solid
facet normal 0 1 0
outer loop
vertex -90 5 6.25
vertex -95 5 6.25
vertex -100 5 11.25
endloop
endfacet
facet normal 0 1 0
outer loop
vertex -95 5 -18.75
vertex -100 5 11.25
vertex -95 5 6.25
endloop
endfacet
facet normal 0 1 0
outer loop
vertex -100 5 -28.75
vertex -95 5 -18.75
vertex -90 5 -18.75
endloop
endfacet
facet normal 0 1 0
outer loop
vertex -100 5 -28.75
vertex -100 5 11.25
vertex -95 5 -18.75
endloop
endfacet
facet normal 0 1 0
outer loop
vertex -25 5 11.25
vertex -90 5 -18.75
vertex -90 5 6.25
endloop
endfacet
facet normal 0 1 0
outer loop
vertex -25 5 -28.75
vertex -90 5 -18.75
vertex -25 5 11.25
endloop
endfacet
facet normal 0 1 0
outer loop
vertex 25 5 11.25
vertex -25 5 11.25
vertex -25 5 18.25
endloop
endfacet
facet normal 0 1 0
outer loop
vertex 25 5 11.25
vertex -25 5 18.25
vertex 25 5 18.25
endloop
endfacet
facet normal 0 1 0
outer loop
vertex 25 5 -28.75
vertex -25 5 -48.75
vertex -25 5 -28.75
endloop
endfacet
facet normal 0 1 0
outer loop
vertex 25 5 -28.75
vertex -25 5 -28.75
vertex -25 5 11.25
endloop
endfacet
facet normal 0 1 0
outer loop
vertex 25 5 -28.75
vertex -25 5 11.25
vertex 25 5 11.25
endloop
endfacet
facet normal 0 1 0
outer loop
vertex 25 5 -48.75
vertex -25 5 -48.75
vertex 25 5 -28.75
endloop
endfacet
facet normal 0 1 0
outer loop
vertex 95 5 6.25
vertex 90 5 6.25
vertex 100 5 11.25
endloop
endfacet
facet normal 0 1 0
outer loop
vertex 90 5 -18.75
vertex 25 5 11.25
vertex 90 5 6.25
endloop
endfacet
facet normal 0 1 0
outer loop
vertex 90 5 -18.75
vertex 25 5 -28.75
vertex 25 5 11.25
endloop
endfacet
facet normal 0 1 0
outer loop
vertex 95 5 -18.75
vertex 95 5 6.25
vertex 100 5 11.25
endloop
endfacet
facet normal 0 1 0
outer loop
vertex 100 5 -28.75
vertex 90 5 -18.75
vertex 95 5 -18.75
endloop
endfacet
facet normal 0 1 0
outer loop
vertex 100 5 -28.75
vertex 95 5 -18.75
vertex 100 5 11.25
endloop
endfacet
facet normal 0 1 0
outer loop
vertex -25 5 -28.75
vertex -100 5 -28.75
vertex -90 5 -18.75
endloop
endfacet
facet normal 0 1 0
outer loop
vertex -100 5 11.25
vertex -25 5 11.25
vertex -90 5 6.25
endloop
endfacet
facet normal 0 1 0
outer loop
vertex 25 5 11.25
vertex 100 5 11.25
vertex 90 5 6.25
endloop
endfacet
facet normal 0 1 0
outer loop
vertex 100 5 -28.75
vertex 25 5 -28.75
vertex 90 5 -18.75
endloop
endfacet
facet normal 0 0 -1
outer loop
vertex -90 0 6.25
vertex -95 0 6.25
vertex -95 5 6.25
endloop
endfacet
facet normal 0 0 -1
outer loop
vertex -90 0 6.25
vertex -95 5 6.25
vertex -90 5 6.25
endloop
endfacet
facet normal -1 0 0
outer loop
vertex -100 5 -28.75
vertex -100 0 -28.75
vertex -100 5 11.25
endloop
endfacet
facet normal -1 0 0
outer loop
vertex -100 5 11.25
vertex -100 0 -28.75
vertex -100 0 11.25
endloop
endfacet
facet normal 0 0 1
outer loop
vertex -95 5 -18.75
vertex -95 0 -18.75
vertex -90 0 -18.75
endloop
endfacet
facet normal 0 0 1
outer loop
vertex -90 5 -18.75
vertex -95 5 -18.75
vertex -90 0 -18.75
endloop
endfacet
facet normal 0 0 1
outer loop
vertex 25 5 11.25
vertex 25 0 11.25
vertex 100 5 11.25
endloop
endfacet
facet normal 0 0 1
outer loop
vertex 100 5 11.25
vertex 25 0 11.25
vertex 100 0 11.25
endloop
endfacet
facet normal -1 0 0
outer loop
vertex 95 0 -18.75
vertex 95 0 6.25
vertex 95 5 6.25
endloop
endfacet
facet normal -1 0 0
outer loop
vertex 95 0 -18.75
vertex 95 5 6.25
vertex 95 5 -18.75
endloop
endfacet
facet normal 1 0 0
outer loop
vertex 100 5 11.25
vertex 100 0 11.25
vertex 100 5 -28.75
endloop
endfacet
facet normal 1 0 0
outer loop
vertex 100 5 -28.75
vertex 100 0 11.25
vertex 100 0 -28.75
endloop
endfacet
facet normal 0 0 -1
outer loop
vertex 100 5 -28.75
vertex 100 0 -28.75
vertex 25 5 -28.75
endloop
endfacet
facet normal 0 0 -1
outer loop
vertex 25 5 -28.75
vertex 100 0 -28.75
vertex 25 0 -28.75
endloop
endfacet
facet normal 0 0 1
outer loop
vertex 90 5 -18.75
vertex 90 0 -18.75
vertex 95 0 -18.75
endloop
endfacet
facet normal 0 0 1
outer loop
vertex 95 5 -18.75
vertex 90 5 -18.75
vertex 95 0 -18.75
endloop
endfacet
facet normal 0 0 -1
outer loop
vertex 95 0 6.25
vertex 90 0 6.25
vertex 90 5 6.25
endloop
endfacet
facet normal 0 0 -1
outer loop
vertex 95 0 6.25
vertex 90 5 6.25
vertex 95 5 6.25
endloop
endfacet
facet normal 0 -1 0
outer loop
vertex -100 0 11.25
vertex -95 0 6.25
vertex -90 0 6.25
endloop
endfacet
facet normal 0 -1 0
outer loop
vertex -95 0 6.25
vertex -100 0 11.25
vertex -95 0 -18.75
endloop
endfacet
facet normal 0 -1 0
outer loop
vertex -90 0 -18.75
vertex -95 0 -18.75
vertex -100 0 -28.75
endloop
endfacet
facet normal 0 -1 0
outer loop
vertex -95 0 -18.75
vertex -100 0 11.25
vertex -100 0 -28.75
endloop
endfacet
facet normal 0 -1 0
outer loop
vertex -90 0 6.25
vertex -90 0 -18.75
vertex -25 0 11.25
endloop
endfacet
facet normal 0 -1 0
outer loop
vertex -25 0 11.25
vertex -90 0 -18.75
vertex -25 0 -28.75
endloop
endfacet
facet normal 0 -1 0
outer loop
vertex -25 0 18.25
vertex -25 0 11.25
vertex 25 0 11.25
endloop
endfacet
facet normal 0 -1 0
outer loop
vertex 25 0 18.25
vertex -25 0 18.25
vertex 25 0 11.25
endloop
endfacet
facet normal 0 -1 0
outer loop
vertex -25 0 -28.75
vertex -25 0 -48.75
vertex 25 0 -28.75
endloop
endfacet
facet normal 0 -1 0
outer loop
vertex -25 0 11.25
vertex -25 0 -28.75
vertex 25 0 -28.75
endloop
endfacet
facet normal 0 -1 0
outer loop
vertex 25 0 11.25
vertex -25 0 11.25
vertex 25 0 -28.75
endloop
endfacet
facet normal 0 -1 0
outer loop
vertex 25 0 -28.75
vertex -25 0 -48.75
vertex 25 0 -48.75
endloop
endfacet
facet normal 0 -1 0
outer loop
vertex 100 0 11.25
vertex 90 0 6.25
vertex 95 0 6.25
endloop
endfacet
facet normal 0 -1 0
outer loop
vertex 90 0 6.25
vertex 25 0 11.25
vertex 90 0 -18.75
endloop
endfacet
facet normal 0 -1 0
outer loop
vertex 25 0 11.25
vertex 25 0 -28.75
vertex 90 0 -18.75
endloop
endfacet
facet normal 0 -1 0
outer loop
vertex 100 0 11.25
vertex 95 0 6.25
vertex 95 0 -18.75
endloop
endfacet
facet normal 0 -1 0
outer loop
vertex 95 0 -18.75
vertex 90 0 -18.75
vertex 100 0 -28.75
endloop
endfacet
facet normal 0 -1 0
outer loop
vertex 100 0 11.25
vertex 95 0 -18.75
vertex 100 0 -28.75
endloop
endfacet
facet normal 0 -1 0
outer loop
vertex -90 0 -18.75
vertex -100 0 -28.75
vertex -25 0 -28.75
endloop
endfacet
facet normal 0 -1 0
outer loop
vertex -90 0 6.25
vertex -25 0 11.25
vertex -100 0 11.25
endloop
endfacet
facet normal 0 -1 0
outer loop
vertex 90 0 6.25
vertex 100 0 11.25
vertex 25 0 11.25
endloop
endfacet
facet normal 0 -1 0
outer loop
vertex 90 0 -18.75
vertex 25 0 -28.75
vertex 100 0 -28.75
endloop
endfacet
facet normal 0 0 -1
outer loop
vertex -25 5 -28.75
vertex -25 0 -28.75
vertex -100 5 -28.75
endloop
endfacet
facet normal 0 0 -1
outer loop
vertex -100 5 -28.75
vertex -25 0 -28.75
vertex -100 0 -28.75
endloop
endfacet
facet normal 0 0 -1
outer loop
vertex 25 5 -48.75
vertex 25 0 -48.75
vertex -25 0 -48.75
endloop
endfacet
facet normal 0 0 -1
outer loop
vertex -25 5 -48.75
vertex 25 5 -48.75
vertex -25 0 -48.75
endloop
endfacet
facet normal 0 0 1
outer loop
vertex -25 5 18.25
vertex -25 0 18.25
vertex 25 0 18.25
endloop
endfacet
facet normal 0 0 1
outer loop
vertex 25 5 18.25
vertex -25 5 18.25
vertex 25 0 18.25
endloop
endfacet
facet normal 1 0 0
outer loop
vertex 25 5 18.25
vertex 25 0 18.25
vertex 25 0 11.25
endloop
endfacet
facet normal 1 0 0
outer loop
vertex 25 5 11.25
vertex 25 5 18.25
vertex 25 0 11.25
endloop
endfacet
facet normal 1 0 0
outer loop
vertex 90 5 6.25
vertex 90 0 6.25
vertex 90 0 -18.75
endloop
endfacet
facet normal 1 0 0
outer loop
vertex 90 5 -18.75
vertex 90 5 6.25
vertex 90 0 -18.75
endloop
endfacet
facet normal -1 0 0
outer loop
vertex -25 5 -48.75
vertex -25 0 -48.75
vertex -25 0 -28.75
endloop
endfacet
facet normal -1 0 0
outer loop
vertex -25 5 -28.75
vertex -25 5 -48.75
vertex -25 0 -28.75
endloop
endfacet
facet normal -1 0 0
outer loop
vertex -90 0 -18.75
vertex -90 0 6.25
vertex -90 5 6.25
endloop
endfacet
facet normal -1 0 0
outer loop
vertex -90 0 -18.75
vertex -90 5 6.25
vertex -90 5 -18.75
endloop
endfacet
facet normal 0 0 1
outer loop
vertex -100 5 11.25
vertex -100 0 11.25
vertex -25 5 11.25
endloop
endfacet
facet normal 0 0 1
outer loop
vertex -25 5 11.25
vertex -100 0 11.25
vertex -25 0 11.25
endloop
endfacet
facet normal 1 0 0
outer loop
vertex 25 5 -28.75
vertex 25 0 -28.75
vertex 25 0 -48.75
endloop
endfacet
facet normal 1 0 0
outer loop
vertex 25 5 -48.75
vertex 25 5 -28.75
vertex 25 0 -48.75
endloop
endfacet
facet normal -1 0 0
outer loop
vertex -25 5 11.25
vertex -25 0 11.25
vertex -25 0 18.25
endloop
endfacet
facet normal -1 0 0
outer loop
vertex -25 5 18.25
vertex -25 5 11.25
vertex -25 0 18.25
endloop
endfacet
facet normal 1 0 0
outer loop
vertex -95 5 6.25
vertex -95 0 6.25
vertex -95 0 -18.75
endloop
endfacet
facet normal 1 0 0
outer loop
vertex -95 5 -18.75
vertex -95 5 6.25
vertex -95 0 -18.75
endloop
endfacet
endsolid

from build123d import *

# Parameters (mm, degrees)
SKETCH1_W           = 5
SKETCH1_H           = 25
BOSS_EXTRUDE1_DEPTH = 5


with BuildPart() as part:
    # Sketch1 → Boss-Extrude1 (new body)
    with BuildSketch(Plane(origin=(0, 0, 0), x_dir=(1, 0, 0), z_dir=(0, 1, 0))):
        Polygon((-25, 28.75), (-100, 28.75), (-100, -11.25), (-25, -11.25), (-25, -18.25), (25, -18.25), (25, -11.25), (100, -11.25), (100, 28.75), (25, 28.75), (25, 48.75), (-25, 48.75), align=None)
        with Locations((92.5, 6.25)):
            Rectangle(SKETCH1_W, SKETCH1_H, mode=Mode.SUBTRACT)
        with Locations((-92.5, 6.25)):
            Rectangle(SKETCH1_W, SKETCH1_H, mode=Mode.SUBTRACT)
    extrude(amount=BOSS_EXTRUDE1_DEPTH)


solid = part.part
